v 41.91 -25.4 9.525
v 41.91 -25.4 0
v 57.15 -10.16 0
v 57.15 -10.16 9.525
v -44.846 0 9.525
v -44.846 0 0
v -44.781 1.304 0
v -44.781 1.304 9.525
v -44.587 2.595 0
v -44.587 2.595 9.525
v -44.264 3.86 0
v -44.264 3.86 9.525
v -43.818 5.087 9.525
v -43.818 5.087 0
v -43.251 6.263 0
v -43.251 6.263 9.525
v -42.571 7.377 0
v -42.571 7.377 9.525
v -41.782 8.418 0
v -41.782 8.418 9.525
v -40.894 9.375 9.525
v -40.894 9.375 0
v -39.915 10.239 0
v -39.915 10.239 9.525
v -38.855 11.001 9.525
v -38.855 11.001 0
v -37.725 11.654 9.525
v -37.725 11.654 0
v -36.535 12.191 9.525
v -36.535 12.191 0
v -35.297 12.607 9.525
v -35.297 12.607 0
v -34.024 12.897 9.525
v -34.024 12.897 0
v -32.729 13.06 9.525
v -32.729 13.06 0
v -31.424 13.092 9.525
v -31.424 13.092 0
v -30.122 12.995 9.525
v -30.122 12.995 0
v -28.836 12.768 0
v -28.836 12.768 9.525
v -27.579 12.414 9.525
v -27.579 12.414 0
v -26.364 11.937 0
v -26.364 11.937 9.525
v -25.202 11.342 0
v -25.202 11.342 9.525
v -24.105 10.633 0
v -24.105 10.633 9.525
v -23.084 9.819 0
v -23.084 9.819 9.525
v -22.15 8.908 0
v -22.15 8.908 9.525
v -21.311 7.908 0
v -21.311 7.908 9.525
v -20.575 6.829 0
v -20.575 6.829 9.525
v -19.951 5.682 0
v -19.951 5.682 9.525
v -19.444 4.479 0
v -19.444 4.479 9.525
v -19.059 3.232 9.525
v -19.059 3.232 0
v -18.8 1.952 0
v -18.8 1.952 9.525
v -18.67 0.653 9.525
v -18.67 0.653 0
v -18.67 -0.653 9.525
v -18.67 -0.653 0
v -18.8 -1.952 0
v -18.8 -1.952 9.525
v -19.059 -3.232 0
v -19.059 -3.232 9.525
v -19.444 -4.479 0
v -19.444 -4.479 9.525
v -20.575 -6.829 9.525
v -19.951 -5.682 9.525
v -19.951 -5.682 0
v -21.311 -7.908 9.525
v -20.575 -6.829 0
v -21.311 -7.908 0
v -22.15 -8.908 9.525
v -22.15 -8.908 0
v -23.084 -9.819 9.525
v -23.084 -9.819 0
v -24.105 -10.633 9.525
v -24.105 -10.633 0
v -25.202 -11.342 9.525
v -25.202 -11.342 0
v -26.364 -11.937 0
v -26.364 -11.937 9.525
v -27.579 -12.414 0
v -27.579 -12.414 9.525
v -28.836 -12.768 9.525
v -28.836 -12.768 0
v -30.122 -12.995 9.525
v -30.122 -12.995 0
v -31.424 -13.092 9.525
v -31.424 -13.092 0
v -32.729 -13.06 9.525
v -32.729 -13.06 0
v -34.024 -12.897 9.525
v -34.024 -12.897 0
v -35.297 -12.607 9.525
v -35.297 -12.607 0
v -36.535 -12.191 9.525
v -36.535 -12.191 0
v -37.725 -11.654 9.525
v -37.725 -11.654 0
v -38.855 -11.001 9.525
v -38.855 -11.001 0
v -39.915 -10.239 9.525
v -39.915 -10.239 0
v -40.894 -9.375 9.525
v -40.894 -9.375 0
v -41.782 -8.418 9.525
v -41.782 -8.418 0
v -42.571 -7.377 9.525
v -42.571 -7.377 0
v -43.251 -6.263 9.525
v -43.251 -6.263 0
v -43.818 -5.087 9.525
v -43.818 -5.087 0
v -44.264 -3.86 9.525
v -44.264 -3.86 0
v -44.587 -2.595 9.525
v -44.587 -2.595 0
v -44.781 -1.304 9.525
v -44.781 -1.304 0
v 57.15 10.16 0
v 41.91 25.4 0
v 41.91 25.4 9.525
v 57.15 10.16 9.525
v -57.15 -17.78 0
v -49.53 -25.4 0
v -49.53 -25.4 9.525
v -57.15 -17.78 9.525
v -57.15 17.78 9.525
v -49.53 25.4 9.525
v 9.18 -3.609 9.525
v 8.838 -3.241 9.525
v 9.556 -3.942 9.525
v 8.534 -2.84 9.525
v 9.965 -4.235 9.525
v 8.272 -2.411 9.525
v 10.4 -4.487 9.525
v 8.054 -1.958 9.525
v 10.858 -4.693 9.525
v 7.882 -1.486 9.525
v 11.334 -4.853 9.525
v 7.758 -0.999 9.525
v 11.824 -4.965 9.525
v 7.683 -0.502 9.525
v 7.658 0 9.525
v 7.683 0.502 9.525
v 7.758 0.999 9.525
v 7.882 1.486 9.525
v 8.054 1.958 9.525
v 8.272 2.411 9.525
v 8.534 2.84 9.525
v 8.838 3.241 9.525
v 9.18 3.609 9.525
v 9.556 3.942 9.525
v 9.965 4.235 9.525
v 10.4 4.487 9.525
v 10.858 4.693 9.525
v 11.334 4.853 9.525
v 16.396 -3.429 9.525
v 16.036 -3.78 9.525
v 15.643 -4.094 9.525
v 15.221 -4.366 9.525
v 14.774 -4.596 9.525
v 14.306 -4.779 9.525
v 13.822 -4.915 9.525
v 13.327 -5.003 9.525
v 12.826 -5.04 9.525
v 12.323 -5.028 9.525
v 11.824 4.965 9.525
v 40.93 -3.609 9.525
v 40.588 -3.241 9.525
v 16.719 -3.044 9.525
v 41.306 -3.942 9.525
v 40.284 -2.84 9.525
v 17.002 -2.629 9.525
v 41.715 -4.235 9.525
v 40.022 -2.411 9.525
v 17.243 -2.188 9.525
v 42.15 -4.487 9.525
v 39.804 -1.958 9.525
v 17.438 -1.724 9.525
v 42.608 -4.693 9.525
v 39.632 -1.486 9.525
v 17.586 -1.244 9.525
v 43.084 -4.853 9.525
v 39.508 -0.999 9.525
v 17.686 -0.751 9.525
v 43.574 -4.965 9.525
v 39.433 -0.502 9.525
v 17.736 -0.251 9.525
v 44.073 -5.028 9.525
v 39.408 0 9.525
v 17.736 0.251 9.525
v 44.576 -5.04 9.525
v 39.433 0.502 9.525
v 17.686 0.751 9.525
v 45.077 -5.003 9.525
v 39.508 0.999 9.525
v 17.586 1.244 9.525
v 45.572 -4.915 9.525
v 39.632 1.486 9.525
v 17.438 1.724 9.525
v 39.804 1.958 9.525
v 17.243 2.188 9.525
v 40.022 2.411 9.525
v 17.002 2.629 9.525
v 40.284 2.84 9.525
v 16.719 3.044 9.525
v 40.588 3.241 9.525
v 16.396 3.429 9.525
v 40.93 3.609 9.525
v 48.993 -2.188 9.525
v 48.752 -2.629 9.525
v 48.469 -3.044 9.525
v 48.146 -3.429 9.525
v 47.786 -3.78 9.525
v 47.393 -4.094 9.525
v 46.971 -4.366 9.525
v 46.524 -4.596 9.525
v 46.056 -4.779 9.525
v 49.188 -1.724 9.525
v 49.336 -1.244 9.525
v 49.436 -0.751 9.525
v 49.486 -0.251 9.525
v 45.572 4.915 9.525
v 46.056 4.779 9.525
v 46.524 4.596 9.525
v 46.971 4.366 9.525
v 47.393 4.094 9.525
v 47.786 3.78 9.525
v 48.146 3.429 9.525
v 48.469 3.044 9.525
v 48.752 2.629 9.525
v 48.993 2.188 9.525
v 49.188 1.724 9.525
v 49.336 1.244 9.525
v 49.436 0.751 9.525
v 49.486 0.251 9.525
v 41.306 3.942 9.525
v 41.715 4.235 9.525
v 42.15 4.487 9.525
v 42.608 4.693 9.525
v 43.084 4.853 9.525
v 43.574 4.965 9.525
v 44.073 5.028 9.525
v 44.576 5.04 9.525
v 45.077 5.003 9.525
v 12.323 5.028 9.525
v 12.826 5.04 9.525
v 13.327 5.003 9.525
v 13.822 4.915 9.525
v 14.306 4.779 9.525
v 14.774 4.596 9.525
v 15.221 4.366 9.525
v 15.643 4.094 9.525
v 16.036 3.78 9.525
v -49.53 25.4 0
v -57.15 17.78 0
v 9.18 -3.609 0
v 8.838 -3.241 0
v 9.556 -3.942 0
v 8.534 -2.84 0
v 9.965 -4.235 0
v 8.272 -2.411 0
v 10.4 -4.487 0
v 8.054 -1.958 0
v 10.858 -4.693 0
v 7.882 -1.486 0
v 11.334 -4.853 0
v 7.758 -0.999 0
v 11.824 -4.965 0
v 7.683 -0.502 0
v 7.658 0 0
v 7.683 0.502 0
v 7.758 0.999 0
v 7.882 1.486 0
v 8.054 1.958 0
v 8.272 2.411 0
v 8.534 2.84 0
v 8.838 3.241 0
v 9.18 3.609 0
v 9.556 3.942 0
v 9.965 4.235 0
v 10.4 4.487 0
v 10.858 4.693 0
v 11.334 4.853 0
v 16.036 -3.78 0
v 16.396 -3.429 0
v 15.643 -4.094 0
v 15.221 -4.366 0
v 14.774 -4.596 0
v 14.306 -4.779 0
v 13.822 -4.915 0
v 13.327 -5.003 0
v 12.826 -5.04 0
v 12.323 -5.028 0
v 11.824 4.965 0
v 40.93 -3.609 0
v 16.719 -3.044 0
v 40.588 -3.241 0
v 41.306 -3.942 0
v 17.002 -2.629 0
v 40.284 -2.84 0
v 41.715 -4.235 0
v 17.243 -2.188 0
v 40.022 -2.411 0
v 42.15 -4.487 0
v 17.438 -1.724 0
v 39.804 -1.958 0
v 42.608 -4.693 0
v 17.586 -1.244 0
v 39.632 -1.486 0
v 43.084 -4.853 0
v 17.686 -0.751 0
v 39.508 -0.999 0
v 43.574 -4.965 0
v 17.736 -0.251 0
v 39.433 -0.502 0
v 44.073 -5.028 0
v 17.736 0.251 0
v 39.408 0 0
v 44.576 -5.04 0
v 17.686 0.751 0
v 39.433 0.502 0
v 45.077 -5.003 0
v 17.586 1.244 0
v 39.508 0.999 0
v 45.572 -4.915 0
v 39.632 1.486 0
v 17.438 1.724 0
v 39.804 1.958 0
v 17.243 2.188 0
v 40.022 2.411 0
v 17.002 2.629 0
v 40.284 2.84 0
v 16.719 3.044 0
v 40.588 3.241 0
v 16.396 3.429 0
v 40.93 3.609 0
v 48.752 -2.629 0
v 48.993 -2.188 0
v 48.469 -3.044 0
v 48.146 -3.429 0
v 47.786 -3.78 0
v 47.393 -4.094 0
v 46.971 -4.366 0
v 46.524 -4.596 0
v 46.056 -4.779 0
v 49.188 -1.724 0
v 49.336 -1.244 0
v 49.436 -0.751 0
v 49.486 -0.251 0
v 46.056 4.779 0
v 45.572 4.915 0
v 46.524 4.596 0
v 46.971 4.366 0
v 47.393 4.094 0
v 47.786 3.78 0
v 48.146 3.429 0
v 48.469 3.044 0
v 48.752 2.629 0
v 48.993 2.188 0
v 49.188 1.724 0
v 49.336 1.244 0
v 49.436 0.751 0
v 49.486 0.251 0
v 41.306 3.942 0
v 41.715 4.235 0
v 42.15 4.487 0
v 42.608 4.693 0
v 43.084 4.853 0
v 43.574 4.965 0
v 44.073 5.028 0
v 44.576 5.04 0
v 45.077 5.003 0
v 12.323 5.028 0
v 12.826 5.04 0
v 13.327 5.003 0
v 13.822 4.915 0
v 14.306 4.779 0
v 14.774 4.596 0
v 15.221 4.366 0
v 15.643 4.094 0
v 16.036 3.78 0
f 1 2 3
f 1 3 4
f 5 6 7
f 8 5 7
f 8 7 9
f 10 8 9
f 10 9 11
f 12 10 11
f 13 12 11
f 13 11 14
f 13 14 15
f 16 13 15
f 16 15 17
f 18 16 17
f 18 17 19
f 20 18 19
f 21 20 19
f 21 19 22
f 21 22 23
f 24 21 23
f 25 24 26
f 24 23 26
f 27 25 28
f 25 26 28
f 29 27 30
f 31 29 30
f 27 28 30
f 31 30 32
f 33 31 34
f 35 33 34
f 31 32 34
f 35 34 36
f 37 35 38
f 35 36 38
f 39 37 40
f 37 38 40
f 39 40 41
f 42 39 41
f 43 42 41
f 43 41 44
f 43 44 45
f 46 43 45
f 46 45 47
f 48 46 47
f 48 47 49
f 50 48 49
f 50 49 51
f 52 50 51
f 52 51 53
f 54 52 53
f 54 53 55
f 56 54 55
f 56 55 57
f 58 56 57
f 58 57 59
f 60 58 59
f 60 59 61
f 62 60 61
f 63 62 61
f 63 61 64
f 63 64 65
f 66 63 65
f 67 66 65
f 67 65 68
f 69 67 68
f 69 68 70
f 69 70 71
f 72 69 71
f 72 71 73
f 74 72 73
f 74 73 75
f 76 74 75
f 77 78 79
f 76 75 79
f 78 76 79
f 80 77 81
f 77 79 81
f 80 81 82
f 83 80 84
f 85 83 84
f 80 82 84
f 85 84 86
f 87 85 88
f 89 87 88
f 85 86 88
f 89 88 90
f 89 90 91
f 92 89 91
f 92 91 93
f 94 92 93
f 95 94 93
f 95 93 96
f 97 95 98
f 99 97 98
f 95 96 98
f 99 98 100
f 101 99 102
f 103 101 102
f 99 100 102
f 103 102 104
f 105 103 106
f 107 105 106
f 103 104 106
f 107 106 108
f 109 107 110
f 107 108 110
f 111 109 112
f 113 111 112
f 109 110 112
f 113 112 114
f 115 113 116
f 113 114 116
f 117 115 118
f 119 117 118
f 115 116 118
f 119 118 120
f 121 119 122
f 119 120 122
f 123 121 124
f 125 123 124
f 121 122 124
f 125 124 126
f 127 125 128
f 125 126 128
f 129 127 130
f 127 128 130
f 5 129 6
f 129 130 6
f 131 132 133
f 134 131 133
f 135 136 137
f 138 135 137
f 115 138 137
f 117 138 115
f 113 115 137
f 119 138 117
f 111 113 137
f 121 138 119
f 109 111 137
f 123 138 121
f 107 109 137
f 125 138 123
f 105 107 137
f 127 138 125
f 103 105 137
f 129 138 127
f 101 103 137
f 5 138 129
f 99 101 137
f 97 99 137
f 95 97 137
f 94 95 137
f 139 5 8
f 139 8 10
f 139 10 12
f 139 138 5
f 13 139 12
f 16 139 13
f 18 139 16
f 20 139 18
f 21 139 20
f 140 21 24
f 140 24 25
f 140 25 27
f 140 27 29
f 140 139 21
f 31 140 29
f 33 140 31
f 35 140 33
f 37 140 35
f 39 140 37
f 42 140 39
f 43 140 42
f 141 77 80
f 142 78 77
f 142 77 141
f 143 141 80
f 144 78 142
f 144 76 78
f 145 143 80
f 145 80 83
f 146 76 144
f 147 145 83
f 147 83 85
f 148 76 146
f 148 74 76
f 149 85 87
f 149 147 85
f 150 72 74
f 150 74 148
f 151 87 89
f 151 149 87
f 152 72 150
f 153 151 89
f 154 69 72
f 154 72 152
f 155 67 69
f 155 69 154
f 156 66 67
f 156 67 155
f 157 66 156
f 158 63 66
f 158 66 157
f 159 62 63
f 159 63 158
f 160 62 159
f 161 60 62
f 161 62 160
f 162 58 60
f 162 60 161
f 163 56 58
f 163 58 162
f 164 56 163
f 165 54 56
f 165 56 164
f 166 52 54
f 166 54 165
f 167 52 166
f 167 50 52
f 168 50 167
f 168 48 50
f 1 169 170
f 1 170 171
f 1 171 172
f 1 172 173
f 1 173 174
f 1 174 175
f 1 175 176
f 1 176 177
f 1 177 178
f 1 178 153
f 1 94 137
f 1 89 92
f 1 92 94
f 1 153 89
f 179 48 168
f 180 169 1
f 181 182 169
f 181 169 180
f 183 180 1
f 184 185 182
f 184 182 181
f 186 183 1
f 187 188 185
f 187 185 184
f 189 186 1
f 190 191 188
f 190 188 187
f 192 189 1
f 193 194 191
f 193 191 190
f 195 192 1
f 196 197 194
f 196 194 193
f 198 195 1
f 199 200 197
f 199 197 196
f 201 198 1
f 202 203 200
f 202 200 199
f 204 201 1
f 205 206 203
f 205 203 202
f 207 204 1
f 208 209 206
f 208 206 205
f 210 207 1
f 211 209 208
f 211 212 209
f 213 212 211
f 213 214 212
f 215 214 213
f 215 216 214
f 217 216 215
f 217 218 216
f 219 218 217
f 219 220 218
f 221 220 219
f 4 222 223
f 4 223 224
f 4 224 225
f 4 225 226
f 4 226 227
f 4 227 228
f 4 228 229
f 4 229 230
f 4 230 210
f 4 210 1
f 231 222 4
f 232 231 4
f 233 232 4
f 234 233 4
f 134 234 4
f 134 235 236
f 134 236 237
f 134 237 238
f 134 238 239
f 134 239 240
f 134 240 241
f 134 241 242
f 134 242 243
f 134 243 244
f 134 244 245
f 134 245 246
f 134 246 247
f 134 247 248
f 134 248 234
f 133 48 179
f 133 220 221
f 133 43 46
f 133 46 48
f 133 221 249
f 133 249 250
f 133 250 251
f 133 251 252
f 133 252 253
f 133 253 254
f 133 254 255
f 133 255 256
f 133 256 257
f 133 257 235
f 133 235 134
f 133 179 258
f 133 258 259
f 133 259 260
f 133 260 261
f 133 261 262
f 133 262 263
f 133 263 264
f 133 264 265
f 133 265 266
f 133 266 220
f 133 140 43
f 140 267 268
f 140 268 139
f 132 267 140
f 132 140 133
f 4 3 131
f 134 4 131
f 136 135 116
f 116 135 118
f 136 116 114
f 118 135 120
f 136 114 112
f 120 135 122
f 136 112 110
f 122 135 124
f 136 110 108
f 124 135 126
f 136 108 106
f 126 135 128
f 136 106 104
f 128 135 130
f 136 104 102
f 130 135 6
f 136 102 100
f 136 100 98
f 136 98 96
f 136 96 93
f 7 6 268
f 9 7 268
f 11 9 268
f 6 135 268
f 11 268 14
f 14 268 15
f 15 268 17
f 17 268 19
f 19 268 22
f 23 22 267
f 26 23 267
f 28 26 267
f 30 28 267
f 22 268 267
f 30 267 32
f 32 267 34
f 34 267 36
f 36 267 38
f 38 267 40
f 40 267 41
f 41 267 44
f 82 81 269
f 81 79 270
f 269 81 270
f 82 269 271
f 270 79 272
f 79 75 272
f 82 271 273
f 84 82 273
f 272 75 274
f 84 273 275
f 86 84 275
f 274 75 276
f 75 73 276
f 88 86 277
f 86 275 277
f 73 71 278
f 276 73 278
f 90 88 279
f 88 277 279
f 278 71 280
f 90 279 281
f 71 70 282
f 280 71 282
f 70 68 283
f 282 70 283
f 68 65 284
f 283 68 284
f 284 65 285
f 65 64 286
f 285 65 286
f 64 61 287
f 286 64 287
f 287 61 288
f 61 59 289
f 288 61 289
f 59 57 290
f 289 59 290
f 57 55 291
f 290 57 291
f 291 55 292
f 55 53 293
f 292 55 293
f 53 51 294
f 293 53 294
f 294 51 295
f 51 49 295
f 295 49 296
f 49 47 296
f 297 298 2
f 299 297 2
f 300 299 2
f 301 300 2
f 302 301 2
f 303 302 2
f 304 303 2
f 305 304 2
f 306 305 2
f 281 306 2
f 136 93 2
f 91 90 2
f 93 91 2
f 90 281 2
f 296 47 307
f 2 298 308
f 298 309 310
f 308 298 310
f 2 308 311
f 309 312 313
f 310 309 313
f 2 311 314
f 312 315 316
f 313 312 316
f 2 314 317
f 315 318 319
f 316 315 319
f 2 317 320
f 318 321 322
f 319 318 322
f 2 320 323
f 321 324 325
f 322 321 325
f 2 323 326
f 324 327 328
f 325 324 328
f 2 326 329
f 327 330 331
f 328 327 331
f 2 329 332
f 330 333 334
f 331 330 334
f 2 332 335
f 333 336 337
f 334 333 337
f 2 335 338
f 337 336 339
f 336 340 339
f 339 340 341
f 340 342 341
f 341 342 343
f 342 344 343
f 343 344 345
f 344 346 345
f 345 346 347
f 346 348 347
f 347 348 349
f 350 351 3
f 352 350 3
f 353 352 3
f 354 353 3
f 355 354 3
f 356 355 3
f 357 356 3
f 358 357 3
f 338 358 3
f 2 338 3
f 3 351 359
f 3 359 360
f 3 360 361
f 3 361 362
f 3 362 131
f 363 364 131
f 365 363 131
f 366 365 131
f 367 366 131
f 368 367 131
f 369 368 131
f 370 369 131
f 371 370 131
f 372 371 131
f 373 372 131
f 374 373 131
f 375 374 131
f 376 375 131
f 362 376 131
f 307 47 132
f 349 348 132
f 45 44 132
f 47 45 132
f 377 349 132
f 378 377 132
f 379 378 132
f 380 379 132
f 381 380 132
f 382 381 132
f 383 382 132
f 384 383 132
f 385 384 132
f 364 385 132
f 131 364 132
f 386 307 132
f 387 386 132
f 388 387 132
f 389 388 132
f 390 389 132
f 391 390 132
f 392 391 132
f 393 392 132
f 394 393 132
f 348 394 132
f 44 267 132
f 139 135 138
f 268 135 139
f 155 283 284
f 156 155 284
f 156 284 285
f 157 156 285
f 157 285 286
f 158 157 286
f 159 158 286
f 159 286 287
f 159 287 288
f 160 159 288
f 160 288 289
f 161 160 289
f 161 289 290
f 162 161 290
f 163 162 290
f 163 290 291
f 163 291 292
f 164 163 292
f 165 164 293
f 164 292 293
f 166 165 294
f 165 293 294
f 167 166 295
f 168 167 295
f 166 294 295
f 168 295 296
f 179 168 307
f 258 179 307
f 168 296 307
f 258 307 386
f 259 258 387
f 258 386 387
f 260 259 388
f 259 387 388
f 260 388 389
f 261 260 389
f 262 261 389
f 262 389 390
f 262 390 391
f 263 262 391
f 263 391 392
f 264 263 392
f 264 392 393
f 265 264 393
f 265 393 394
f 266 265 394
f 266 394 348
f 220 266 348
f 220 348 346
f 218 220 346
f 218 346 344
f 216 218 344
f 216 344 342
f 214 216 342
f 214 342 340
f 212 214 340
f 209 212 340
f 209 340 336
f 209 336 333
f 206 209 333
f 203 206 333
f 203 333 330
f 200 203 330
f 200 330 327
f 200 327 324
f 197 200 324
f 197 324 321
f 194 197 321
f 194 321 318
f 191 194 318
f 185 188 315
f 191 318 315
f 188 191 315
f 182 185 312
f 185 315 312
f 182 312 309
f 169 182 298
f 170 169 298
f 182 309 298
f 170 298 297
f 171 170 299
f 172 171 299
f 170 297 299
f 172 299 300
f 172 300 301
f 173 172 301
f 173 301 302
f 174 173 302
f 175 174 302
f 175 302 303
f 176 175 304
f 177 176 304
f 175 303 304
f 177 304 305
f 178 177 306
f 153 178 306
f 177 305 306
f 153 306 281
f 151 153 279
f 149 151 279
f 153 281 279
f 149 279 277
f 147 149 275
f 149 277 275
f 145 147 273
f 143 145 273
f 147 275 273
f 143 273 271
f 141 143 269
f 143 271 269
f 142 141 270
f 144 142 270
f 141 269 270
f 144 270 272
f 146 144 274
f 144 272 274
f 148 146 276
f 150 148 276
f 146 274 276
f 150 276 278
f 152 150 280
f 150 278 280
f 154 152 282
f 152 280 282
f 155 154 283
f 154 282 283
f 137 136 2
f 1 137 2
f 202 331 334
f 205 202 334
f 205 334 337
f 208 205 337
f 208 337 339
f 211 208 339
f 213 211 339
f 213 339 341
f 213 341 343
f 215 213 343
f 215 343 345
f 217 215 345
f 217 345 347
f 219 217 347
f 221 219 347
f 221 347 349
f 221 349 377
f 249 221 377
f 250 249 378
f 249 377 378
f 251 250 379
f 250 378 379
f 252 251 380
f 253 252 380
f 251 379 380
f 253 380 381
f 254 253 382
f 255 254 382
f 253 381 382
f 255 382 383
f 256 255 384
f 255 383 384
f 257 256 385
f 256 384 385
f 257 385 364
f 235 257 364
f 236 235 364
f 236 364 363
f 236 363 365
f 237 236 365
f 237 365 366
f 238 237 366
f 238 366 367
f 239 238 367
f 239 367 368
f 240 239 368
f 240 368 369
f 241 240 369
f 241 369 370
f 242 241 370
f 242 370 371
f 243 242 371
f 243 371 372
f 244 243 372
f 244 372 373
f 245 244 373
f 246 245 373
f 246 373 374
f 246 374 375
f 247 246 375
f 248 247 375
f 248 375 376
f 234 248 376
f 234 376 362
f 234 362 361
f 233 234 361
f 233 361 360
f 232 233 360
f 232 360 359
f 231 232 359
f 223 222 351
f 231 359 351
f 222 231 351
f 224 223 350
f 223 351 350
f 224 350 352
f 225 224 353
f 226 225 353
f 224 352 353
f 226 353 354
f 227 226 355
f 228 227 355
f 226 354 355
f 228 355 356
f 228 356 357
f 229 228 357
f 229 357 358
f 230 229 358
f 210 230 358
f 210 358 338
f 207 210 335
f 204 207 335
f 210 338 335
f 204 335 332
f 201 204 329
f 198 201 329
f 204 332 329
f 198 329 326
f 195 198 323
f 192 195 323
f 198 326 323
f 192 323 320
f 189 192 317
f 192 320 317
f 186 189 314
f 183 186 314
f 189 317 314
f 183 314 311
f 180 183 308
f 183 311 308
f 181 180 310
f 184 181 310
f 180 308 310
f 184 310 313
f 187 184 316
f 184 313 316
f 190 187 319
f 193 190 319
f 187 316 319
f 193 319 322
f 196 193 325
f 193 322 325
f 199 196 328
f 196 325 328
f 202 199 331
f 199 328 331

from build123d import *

# Parameters (mm, degrees)
SKETCH1_W               = 114.3
SKETCH1_H               = 50.8
BOSS_EXTRUDE1_DEPTH     = 9.525
F_3_8_CLEARANCE_HOLE1_D = 10.0838
F_1_CLEARANCE_HOLE1_D   = 26.19248
CHAMFER1_SIZE           = 7.62
CHAMFER2_SIZE           = 15.24


with BuildPart() as part:
    # Sketch1 → Boss-Extrude1 (new body)
    with BuildSketch(Plane.XY):
        Rectangle(SKETCH1_W, SKETCH1_H)
    extrude(amount=BOSS_EXTRUDE1_DEPTH)

    # 3/8 Clearance Hole1 (through all)
    with Locations(Plane.XY.offset(9.525)):
        with Locations((44.45, 0), (12.7, 0)):
            Hole(F_3_8_CLEARANCE_HOLE1_D / 2)

    # 1 Clearance Hole1 (through all)
    with Locations(Plane.XY.offset(9.525)):
        with Locations((-31.75, 0)):
            Hole(F_1_CLEARANCE_HOLE1_D / 2)

    # Chamfer1
    chamfer1_edges = [part.edges().sort_by_distance(p)[0] for p in [
        (-57.15, -25.4, 4.7625),
        (-57.15, 25.4, 4.7625),
    ]]
    chamfer(chamfer1_edges, length=CHAMFER1_SIZE)

    # Chamfer2
    chamfer2_edges = [part.edges().sort_by_distance(p)[0] for p in [
        (57.15, -25.4, 4.7625),
        (57.15, 25.4, 4.7625),
    ]]
    chamfer(chamfer2_edges, length=CHAMFER2_SIZE)


solid = part.part
